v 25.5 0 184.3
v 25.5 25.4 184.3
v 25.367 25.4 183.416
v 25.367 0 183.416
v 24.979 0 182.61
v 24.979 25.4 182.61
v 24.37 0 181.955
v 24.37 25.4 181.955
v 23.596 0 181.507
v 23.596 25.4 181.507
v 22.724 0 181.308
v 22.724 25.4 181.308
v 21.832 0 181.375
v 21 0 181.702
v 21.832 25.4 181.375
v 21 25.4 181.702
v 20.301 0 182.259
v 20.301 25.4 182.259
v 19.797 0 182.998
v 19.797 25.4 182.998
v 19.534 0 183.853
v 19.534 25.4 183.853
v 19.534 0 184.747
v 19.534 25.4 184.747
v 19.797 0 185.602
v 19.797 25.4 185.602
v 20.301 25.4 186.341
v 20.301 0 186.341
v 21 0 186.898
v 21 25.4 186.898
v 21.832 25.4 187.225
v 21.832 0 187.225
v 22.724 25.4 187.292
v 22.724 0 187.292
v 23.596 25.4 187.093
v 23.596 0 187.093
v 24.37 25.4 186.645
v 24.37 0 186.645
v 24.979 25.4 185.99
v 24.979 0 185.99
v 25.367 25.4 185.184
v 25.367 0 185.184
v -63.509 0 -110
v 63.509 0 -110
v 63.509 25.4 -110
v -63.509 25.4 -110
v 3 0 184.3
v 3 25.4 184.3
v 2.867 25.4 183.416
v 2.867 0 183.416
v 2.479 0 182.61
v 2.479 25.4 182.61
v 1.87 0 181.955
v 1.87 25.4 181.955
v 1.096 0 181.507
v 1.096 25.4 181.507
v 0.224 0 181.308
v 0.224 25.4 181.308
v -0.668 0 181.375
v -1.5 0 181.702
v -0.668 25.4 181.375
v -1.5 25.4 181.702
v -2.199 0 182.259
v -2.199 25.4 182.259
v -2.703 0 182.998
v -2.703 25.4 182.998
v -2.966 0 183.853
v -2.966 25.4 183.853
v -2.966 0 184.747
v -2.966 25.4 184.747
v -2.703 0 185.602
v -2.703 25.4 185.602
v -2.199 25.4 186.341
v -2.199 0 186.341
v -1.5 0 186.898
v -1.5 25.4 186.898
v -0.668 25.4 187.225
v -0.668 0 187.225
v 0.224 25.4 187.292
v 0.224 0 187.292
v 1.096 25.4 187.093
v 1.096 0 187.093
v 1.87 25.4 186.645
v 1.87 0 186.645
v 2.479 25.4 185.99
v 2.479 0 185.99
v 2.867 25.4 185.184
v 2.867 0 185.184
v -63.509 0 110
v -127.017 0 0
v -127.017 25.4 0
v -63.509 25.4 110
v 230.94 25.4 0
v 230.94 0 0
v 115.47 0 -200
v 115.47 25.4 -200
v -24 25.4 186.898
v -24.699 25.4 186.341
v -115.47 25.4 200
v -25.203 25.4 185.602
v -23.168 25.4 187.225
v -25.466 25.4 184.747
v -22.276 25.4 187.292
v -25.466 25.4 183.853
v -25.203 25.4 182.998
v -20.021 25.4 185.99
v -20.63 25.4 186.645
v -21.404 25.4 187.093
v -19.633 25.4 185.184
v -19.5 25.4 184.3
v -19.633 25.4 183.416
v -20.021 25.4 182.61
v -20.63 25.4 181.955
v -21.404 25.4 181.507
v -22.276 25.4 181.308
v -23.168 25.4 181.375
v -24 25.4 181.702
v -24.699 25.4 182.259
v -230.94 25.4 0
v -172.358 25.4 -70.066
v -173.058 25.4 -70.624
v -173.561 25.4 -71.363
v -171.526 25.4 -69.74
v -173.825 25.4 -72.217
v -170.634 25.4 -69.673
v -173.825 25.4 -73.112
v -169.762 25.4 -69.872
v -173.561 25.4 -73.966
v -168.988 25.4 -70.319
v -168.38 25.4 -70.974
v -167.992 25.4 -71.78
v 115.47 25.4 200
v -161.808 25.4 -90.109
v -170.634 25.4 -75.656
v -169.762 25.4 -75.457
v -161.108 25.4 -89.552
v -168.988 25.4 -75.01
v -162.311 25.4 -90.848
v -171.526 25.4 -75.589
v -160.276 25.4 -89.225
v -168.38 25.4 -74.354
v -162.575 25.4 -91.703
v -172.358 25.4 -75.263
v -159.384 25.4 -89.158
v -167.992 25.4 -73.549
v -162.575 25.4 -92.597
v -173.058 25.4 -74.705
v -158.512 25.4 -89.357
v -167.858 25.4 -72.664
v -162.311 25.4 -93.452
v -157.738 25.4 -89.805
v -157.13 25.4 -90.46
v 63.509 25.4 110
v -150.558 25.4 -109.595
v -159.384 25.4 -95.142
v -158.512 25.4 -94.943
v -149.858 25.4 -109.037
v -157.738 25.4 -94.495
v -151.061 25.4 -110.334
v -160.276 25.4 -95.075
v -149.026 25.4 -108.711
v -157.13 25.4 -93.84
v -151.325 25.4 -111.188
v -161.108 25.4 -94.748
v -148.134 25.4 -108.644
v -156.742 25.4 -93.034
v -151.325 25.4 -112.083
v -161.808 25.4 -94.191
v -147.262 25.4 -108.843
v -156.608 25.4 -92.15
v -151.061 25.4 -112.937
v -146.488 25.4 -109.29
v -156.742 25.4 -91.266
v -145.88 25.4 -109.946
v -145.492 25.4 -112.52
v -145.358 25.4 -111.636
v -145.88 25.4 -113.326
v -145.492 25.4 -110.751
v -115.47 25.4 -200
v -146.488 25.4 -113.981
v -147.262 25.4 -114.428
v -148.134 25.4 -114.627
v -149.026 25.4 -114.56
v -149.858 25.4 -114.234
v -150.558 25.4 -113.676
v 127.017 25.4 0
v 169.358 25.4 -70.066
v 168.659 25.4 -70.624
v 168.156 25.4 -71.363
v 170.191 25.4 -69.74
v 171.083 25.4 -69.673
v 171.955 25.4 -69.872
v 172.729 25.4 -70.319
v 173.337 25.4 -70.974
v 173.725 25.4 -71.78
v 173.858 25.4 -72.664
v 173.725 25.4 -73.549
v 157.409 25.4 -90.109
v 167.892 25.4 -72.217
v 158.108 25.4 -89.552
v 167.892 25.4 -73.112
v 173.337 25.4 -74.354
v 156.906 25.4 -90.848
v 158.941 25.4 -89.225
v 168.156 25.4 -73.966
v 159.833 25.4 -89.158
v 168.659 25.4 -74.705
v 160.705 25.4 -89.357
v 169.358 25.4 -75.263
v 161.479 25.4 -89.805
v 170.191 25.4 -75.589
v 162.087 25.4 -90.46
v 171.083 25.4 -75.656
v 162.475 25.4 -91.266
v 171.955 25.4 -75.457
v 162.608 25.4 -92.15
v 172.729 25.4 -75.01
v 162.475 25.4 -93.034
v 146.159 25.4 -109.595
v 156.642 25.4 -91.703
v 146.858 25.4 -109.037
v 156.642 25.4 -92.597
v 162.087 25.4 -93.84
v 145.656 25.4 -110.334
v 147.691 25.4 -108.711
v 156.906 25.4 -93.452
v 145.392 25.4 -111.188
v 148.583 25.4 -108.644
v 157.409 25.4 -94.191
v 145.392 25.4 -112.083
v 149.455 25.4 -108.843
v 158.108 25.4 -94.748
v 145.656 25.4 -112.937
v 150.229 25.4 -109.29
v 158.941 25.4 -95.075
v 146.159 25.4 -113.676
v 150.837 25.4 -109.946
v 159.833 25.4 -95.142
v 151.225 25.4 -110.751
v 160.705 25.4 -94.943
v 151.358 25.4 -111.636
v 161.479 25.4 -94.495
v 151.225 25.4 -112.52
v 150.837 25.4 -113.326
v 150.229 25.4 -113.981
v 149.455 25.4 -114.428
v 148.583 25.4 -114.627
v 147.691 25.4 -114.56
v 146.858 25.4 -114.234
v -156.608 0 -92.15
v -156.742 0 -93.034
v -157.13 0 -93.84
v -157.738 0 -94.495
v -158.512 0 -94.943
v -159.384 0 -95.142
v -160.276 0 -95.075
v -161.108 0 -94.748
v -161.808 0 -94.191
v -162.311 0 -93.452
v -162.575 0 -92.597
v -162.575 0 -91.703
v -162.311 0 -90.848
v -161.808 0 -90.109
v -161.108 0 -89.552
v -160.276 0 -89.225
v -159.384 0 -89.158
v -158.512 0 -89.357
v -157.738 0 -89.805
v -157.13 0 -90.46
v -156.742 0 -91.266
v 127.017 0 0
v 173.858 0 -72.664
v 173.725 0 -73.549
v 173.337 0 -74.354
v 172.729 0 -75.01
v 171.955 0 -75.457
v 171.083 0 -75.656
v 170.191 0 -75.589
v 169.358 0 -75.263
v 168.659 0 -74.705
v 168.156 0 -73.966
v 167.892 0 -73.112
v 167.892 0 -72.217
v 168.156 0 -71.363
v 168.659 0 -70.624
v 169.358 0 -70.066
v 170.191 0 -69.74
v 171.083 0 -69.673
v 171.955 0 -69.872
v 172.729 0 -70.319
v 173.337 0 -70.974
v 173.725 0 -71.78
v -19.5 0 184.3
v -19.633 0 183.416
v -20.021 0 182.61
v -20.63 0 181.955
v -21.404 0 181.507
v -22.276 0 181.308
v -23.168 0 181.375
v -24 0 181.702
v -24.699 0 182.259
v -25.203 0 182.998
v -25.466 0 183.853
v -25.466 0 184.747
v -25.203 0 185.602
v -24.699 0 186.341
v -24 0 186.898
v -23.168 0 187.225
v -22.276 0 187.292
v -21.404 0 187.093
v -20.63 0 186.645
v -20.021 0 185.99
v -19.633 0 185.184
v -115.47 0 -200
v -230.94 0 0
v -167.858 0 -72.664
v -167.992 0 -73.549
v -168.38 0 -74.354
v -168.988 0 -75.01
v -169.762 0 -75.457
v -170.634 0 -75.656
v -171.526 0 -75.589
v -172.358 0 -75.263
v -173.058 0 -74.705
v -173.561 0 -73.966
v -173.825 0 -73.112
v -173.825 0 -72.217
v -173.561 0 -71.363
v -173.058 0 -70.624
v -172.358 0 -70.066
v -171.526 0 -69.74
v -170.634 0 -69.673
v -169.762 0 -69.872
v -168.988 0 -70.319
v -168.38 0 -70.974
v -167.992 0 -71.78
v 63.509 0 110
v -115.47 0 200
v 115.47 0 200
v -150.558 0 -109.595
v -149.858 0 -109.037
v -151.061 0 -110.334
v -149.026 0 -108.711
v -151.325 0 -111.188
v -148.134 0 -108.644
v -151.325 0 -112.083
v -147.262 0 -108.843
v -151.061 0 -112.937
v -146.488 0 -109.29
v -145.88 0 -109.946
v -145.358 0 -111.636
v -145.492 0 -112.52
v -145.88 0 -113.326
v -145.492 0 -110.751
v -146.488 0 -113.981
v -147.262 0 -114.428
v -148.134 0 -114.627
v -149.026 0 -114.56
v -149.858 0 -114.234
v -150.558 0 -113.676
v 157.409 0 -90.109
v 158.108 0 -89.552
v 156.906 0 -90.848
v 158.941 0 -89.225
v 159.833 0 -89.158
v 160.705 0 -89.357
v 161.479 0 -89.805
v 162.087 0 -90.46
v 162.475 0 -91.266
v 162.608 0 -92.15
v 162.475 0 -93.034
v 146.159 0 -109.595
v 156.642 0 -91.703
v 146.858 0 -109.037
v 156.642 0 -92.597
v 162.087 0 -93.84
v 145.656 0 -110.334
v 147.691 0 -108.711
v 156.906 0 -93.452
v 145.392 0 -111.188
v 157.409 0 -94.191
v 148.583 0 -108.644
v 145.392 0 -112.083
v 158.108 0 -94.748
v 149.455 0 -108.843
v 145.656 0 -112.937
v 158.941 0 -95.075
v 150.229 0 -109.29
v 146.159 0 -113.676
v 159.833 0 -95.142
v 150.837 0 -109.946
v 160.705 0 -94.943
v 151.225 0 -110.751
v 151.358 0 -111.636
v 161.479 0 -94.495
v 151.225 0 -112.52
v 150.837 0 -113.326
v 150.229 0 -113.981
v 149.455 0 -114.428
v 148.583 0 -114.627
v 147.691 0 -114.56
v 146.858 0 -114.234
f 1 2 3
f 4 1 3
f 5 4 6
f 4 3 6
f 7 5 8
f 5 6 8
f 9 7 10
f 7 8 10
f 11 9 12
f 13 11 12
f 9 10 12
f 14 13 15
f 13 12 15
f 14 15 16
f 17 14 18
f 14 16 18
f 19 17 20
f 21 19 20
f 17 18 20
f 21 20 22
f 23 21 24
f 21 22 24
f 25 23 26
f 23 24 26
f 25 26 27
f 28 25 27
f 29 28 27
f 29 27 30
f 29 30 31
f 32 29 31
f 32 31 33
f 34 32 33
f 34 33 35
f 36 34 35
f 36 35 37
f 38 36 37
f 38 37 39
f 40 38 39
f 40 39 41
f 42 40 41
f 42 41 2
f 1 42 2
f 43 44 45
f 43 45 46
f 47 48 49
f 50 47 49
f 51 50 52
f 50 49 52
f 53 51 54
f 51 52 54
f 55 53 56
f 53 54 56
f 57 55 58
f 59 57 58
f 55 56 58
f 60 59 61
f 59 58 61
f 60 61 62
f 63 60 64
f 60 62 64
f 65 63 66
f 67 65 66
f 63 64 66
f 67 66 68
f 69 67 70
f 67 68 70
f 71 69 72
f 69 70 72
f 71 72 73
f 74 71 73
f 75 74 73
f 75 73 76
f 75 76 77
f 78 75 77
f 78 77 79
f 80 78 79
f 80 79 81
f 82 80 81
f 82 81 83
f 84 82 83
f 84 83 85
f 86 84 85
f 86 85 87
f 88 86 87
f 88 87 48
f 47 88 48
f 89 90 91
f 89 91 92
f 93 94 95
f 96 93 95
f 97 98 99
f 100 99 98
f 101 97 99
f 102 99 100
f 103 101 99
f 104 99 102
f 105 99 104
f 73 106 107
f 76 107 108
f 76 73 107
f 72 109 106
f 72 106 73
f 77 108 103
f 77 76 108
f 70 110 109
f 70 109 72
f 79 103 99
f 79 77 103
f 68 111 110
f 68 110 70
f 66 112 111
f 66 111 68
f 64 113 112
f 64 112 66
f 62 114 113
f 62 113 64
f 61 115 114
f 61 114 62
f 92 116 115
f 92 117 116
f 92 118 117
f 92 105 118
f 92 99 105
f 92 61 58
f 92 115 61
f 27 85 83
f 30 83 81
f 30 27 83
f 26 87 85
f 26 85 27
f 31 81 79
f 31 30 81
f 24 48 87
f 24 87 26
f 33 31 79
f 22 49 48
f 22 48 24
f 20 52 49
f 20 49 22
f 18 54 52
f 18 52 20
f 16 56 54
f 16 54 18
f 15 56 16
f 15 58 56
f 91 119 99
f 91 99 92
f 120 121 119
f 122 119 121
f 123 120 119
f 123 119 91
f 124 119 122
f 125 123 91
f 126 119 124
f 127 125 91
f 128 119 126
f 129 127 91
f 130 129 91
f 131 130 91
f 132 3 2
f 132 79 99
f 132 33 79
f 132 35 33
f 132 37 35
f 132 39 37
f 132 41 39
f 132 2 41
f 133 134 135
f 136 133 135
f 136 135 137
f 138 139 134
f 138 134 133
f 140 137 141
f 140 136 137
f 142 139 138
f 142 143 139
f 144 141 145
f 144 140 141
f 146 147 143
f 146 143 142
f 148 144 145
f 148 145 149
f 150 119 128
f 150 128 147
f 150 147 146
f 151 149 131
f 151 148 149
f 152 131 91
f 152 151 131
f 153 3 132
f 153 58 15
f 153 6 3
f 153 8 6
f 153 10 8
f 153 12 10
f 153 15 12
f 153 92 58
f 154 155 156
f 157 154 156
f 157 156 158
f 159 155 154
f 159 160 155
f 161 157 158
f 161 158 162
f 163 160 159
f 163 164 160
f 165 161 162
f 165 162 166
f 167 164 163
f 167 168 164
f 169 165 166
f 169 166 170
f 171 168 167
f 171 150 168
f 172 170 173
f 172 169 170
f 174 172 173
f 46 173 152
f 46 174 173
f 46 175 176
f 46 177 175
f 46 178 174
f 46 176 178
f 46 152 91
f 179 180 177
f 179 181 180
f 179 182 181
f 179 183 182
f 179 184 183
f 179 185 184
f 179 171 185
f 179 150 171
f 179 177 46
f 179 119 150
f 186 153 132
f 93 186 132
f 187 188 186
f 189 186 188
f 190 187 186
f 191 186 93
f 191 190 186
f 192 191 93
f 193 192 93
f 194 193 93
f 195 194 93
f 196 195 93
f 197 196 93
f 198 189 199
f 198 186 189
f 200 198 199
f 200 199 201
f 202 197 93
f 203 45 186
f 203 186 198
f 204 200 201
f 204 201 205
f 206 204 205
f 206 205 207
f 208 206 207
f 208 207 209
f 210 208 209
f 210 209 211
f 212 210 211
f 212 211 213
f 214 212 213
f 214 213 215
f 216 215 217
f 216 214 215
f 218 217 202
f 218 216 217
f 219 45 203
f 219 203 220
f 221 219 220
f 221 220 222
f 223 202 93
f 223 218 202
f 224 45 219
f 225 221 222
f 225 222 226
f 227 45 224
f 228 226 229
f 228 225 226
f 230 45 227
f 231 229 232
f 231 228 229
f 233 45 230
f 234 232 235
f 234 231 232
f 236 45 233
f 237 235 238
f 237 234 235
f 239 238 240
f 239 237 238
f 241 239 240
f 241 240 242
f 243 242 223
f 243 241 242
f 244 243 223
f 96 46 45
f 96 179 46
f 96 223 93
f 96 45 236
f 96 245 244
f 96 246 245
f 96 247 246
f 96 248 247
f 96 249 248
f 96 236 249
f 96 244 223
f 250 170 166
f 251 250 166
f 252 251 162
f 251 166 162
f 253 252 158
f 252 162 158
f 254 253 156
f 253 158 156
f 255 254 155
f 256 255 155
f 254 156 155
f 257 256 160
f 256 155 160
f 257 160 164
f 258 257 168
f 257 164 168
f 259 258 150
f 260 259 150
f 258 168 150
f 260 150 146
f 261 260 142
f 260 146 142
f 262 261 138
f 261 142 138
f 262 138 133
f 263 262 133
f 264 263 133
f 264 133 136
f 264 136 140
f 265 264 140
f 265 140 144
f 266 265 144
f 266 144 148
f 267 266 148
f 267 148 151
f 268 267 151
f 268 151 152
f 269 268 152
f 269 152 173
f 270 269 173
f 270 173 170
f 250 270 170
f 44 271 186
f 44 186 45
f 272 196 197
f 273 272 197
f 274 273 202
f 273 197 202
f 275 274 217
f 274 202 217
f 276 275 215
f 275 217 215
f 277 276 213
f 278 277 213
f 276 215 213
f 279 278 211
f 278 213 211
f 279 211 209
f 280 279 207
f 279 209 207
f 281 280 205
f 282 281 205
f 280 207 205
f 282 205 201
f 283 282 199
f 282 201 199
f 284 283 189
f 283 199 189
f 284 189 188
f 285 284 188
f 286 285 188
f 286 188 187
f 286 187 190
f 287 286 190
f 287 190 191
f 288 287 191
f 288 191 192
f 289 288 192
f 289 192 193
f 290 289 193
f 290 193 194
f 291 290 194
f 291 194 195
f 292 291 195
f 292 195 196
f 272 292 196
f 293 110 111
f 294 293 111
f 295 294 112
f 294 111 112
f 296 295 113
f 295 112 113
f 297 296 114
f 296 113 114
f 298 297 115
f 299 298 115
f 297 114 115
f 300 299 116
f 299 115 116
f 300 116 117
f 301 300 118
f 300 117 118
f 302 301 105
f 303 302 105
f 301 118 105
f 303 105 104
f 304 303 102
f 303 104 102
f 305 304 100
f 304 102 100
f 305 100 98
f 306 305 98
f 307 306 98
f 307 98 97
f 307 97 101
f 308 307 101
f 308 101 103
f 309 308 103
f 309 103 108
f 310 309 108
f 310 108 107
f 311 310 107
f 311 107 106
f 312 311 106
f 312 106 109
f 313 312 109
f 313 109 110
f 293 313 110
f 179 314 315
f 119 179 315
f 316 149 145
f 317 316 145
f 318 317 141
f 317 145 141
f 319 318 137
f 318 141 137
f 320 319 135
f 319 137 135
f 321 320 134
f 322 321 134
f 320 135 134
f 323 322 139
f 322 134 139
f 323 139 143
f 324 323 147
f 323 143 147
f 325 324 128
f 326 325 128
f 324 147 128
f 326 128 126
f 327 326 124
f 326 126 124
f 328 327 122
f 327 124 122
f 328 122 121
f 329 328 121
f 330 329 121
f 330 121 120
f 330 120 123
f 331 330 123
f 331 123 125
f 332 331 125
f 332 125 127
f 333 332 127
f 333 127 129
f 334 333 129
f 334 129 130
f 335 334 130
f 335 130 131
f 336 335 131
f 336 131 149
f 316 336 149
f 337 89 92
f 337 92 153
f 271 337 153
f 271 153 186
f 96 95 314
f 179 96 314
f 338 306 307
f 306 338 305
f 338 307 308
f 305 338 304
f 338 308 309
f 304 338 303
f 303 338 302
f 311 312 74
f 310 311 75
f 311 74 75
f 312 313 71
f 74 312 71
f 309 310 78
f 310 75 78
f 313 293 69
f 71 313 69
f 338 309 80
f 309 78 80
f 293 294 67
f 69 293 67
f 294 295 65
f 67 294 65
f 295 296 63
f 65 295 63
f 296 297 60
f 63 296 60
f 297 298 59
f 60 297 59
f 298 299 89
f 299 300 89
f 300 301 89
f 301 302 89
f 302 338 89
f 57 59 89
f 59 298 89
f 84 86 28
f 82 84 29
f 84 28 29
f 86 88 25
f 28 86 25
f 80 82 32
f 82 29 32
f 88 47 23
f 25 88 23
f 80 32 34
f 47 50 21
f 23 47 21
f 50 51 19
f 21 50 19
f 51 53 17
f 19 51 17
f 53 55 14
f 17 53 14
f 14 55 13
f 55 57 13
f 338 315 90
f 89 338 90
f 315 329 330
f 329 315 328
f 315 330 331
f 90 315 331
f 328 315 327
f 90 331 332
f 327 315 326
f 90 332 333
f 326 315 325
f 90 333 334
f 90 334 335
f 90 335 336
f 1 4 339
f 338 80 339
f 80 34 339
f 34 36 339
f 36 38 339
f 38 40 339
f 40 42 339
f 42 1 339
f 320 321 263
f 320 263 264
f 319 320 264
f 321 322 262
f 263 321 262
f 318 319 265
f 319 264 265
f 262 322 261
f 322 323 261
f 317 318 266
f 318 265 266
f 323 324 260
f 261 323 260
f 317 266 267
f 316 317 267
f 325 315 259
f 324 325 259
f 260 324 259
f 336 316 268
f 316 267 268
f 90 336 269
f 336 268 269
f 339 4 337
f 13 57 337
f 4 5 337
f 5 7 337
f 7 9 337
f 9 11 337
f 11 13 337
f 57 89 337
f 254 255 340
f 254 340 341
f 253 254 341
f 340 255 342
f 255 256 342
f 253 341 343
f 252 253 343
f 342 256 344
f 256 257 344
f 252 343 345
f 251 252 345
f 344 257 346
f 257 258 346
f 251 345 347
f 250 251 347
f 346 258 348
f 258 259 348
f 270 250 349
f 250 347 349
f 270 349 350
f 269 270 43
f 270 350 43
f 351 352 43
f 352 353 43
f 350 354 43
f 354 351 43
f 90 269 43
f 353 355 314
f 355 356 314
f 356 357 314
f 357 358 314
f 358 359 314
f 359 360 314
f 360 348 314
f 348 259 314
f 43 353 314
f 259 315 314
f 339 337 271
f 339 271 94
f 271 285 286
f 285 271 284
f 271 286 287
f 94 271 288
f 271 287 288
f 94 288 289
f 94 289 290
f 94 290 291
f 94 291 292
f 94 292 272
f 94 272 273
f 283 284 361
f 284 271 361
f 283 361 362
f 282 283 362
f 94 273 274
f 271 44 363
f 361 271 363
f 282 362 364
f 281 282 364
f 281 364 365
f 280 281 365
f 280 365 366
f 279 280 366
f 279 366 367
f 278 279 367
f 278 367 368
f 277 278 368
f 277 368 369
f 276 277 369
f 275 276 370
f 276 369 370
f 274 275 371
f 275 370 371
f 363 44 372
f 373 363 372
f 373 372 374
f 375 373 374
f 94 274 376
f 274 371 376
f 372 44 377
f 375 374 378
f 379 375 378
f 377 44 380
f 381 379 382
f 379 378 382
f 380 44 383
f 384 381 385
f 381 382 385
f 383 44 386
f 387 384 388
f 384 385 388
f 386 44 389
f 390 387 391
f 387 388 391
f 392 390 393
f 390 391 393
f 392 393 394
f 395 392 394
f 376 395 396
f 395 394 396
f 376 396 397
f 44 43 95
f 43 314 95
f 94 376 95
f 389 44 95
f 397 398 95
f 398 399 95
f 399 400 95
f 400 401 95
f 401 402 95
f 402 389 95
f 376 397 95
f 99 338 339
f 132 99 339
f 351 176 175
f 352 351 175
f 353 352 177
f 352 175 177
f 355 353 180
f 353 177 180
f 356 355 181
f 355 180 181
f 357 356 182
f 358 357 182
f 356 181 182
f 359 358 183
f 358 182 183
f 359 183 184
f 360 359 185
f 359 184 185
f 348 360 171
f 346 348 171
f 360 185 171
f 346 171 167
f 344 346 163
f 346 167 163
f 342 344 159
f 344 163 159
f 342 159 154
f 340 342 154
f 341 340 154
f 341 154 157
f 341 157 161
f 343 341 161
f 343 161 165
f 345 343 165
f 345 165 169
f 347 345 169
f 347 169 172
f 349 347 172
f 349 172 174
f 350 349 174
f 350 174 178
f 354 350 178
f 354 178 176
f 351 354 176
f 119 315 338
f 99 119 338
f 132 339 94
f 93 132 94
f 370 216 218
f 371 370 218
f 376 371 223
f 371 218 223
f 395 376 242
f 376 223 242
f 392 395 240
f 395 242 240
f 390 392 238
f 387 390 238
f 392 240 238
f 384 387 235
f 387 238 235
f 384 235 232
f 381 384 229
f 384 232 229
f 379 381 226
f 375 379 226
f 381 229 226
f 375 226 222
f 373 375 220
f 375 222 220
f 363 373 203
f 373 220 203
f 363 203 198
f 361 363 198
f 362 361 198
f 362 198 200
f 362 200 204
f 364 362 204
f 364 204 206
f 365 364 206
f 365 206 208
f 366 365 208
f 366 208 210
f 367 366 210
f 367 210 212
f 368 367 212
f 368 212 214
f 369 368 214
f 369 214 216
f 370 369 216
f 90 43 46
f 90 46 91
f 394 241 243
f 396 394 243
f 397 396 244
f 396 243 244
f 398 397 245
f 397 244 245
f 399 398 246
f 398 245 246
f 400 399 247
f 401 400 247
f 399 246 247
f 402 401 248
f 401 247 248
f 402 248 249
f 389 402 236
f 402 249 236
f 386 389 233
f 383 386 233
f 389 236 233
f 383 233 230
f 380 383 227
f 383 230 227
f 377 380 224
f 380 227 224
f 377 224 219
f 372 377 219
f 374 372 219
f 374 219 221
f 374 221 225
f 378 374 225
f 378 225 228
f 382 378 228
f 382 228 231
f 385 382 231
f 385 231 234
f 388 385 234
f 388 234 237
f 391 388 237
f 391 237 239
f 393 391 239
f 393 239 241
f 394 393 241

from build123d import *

# Parameters (mm, degrees)
SALIENTE_EXTRUIR1_DEPTH = 25.4
CROQUIS2_R              = 3
CORTAR_EXTRUIR2_DEPTH   = 26.4


with BuildPart() as part:
    # Croquis1 → Saliente-Extruir1 (new body)
    with BuildSketch(Plane(origin=(0, 0, 0), x_dir=(1, 0, 0), z_dir=(0, 1, 0))):
        Polygon((115.470053838, -200), (230.940107676, 0), (115.470053838, 200), (-115.470053838, 200), (-230.940107676, 0), (-115.470053838, -200), align=None)
        Polygon((127.017059222, 0), (63.508529611, 110), (-63.508529611, 110), (-127.017059222, 0), (-63.508529611, -110), (63.508529611, -110), align=None, mode=Mode.SUBTRACT)
    extrude(amount=SALIENTE_EXTRUIR1_DEPTH)

    # Croquis2 → Cortar-Extruir2 (cut, through all)
    with BuildSketch(Plane(origin=(0, 25.4, 0), x_dir=(1, 0, 0), z_dir=(0, 1, 0))):
        with Locations((0, -184.3)):
            Circle(CROQUIS2_R)
        with Locations((-22.5, -184.3)):
            Circle(CROQUIS2_R)
        with Locations((22.5, -184.3)):
            Circle(CROQUIS2_R)
        with Locations((-148.358481917, 111.635571585)):
            Circle(CROQUIS2_R)
        with Locations((-159.608481917, 92.15)):
            Circle(CROQUIS2_R)
        with Locations((-170.858481917, 72.664428415)):
            Circle(CROQUIS2_R)
        with Locations((170.858481917, 72.664428415)):
            Circle(CROQUIS2_R)
        with Locations((159.608481917, 92.15)):
            Circle(CROQUIS2_R)
        with Locations((148.358481917, 111.635571585)):
            Circle(CROQUIS2_R)
    extrude(amount=-CORTAR_EXTRUIR2_DEPTH, mode=Mode.SUBTRACT)


solid = part.part
